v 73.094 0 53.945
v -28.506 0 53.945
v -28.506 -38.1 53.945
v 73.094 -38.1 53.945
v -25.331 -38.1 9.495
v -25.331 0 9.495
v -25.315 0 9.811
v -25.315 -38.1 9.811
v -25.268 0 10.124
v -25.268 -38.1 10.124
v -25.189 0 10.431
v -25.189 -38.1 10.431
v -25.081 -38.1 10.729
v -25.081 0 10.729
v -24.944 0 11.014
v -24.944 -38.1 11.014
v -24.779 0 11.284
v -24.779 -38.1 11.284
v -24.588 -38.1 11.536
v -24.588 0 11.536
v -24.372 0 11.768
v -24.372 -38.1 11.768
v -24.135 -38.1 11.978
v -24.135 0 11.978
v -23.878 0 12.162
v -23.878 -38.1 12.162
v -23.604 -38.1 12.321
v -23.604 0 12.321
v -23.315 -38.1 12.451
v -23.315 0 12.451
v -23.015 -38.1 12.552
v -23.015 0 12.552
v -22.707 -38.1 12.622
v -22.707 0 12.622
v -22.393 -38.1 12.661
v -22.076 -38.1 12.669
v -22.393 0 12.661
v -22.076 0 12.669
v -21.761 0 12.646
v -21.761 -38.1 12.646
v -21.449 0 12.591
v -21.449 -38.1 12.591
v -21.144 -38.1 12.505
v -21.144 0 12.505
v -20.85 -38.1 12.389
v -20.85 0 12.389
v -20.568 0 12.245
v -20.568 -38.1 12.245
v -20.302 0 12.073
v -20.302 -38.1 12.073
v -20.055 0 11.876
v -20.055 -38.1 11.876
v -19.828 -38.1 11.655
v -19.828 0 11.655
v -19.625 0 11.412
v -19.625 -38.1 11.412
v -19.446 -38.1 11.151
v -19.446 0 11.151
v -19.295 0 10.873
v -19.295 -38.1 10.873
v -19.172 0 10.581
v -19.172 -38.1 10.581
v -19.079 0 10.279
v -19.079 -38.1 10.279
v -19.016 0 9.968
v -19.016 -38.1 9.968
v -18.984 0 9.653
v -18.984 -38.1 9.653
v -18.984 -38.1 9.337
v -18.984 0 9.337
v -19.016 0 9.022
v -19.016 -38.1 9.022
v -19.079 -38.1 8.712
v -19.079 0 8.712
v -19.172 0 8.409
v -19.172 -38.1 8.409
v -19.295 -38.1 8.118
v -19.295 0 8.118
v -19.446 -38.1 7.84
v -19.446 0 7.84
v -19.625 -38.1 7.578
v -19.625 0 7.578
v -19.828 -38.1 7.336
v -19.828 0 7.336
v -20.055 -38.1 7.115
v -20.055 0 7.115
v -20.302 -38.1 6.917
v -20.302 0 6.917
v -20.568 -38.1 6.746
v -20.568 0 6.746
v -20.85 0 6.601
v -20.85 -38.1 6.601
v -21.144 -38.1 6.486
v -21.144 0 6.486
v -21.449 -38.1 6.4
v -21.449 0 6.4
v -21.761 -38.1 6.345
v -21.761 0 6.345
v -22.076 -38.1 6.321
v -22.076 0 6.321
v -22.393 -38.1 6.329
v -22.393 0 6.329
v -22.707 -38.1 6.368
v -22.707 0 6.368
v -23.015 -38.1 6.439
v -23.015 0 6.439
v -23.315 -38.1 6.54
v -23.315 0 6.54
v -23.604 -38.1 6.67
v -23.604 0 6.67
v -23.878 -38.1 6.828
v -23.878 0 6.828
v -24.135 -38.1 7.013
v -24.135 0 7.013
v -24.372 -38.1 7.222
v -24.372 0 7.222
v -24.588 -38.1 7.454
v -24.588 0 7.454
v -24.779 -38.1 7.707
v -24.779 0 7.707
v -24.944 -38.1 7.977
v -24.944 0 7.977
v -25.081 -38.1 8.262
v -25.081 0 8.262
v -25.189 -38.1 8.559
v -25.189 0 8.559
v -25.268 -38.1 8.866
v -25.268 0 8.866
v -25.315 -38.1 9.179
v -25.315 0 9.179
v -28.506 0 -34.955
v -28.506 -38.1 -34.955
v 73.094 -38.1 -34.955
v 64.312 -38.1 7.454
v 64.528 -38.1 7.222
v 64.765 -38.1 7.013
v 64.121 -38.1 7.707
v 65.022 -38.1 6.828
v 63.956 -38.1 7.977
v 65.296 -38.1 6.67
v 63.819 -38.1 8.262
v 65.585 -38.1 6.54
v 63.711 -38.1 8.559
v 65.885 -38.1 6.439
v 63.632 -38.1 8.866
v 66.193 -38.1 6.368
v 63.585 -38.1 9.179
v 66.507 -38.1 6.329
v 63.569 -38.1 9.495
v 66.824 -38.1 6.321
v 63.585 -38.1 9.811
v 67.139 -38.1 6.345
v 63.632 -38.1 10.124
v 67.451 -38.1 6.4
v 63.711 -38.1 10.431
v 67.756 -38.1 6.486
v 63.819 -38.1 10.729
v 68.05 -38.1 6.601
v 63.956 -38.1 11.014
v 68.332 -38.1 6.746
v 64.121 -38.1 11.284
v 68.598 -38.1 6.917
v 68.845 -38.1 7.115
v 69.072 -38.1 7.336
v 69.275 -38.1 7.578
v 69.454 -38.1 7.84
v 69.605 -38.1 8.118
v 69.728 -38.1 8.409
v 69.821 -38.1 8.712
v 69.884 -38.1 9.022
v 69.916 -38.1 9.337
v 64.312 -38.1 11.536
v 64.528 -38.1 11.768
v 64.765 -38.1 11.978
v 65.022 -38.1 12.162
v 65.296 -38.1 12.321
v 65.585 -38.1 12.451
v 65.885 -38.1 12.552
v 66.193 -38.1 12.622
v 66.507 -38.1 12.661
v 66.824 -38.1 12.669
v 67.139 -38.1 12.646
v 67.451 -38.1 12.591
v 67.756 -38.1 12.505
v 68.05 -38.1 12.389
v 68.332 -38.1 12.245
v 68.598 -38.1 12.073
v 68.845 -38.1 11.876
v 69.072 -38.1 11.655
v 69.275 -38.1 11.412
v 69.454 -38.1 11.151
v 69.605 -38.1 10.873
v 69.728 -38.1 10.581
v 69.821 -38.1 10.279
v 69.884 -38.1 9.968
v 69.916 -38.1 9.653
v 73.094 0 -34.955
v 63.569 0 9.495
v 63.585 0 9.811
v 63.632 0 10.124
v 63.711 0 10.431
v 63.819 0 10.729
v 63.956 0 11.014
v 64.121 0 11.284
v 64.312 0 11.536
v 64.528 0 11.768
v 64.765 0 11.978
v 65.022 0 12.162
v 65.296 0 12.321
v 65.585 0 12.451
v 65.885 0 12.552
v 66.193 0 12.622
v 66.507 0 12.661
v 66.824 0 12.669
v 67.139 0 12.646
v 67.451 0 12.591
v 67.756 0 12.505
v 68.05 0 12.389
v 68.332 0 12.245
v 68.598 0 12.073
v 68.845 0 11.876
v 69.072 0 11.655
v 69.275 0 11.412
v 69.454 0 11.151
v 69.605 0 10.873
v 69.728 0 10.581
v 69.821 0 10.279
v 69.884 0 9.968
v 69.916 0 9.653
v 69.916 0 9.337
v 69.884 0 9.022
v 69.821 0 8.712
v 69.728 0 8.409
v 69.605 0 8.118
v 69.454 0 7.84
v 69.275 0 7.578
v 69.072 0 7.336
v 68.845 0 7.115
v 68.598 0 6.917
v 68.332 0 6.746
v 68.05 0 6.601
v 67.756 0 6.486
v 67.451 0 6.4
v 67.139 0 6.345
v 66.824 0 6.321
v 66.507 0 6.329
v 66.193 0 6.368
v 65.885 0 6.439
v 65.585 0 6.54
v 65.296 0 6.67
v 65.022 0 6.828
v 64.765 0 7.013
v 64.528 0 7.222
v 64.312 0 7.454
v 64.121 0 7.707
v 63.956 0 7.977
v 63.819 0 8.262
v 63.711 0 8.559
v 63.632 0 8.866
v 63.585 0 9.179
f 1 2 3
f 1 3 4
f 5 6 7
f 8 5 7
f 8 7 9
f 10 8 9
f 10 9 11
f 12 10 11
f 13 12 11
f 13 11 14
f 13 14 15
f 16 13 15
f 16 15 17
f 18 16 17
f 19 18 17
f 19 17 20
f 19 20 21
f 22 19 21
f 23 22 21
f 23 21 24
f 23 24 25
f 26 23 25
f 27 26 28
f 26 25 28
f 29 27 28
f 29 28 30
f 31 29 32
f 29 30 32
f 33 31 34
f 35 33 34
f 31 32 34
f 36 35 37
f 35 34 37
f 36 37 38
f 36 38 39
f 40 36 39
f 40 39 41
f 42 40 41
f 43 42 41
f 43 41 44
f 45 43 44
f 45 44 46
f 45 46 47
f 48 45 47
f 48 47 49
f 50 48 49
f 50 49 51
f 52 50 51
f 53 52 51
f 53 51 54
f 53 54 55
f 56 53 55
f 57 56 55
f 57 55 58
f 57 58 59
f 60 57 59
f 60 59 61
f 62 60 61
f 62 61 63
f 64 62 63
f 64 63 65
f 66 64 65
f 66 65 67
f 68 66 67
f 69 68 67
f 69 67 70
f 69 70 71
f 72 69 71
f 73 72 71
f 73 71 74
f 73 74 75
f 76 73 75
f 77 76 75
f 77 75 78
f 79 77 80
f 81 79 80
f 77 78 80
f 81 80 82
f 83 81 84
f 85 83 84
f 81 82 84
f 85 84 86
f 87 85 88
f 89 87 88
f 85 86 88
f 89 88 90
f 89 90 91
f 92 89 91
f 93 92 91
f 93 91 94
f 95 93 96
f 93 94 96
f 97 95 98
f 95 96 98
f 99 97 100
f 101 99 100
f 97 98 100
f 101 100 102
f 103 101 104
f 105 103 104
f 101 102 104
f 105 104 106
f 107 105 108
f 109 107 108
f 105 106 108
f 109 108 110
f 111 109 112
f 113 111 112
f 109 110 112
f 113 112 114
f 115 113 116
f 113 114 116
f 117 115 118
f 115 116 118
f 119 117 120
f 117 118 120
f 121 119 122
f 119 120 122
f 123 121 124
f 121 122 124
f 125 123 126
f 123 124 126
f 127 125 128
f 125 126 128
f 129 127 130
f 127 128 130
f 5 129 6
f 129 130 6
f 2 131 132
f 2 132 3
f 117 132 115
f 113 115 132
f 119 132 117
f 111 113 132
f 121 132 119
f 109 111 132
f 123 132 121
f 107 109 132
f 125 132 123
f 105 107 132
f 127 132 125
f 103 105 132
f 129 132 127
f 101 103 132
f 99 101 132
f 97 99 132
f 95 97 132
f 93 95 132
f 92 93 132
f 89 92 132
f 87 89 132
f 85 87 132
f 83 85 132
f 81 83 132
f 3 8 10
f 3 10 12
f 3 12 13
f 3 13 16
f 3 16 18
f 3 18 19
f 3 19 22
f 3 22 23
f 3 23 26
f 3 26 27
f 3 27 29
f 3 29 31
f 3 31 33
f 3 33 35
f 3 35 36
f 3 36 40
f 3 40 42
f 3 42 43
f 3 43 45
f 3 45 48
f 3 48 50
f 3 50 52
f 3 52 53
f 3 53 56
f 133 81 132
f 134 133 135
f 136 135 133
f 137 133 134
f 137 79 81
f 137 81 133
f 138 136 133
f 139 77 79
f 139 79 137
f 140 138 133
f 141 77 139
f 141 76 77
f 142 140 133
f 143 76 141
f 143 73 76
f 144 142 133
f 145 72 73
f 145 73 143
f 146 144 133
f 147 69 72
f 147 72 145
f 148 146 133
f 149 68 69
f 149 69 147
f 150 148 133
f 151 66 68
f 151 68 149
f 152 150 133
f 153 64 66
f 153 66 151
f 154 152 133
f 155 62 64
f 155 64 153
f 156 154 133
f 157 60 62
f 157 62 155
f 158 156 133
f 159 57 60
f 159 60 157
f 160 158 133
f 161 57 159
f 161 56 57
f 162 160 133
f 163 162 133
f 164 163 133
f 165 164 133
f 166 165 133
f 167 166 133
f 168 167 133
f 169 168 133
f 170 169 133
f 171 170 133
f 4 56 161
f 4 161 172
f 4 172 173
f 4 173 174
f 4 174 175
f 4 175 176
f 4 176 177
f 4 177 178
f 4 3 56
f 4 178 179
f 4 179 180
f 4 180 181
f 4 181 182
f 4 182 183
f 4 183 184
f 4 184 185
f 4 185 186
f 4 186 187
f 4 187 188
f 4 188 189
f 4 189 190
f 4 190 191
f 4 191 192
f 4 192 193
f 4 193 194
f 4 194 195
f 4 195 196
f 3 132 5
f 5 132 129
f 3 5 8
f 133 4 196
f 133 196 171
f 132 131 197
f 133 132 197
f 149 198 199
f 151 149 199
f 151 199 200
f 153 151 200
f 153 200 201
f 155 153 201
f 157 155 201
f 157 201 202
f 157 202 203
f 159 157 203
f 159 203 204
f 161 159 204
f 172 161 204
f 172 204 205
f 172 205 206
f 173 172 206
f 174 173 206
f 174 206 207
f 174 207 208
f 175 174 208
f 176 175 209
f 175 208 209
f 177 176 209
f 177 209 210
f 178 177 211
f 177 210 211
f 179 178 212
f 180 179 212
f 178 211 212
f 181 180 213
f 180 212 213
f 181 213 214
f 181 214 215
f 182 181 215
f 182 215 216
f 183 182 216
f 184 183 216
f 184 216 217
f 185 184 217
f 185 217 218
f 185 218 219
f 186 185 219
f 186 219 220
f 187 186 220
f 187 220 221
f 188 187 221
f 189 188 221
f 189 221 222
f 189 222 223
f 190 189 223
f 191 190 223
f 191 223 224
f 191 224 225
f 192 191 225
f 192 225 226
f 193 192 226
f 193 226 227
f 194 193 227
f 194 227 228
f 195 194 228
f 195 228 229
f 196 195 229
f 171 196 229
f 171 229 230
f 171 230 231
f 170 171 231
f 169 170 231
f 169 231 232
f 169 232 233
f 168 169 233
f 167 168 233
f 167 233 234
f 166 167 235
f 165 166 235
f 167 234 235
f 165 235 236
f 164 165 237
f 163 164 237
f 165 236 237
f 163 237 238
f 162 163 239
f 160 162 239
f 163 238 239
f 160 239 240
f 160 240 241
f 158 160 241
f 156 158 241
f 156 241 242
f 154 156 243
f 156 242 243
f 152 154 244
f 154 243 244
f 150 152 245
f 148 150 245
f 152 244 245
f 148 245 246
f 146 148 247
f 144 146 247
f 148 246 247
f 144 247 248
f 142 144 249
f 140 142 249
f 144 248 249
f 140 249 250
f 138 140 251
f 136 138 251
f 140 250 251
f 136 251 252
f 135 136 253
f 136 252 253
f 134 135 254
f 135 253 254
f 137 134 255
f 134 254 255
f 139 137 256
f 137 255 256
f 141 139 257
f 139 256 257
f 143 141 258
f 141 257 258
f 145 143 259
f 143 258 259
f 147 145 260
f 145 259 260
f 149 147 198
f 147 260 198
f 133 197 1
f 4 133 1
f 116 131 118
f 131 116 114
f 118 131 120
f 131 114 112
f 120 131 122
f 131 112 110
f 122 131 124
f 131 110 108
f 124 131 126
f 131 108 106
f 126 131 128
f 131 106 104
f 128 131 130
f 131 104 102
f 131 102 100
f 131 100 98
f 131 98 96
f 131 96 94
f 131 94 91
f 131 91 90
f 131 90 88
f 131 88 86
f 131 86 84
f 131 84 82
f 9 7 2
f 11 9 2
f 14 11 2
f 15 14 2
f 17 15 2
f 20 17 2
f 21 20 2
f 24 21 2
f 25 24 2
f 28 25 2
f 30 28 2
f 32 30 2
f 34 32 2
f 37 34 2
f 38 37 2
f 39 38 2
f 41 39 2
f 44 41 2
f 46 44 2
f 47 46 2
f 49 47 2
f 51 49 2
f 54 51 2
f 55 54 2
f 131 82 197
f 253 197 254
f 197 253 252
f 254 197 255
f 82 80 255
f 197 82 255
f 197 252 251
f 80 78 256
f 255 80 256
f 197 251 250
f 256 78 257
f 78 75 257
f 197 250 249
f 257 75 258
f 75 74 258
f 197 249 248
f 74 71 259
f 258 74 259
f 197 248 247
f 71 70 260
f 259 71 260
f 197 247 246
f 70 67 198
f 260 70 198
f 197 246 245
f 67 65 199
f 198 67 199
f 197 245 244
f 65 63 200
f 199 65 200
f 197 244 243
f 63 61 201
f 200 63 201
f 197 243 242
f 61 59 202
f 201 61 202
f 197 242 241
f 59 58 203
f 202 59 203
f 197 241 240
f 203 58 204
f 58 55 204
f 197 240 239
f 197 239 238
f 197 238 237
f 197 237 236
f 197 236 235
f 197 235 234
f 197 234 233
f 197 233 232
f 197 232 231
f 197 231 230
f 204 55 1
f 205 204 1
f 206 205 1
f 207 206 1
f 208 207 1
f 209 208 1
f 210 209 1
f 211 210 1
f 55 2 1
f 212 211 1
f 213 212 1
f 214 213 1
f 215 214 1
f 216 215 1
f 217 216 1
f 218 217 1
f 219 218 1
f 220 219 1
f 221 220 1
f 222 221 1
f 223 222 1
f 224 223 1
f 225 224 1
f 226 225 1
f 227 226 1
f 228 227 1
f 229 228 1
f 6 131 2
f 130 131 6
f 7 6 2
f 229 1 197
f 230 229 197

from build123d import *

# Parameters (mm, degrees)
F0_W     = 101.6
F0_H     = 88.9
F1_DEPTH = 38.1
F3_D     = 6.35
F4_D     = 6.35


with BuildPart() as f1:
    # F0 (on Front) → F1 (new body)
    with BuildSketch(Plane.XZ):
        with Locations((22.29446, 9.495236)):
            Rectangle(F0_W, F0_H)
    extrude(amount=F1_DEPTH)

    # F3 (through all)
    with Locations(Plane.XZ.offset(38.1)):
        with Locations((-22.15554, 9.495236)):
            Hole(F3_D / 2)

    # F4 (through all)
    with Locations(Plane.XZ.offset(38.1)):
        with Locations((66.74446, 9.495236)):
            Hole(F4_D / 2)


solid = f1.part
